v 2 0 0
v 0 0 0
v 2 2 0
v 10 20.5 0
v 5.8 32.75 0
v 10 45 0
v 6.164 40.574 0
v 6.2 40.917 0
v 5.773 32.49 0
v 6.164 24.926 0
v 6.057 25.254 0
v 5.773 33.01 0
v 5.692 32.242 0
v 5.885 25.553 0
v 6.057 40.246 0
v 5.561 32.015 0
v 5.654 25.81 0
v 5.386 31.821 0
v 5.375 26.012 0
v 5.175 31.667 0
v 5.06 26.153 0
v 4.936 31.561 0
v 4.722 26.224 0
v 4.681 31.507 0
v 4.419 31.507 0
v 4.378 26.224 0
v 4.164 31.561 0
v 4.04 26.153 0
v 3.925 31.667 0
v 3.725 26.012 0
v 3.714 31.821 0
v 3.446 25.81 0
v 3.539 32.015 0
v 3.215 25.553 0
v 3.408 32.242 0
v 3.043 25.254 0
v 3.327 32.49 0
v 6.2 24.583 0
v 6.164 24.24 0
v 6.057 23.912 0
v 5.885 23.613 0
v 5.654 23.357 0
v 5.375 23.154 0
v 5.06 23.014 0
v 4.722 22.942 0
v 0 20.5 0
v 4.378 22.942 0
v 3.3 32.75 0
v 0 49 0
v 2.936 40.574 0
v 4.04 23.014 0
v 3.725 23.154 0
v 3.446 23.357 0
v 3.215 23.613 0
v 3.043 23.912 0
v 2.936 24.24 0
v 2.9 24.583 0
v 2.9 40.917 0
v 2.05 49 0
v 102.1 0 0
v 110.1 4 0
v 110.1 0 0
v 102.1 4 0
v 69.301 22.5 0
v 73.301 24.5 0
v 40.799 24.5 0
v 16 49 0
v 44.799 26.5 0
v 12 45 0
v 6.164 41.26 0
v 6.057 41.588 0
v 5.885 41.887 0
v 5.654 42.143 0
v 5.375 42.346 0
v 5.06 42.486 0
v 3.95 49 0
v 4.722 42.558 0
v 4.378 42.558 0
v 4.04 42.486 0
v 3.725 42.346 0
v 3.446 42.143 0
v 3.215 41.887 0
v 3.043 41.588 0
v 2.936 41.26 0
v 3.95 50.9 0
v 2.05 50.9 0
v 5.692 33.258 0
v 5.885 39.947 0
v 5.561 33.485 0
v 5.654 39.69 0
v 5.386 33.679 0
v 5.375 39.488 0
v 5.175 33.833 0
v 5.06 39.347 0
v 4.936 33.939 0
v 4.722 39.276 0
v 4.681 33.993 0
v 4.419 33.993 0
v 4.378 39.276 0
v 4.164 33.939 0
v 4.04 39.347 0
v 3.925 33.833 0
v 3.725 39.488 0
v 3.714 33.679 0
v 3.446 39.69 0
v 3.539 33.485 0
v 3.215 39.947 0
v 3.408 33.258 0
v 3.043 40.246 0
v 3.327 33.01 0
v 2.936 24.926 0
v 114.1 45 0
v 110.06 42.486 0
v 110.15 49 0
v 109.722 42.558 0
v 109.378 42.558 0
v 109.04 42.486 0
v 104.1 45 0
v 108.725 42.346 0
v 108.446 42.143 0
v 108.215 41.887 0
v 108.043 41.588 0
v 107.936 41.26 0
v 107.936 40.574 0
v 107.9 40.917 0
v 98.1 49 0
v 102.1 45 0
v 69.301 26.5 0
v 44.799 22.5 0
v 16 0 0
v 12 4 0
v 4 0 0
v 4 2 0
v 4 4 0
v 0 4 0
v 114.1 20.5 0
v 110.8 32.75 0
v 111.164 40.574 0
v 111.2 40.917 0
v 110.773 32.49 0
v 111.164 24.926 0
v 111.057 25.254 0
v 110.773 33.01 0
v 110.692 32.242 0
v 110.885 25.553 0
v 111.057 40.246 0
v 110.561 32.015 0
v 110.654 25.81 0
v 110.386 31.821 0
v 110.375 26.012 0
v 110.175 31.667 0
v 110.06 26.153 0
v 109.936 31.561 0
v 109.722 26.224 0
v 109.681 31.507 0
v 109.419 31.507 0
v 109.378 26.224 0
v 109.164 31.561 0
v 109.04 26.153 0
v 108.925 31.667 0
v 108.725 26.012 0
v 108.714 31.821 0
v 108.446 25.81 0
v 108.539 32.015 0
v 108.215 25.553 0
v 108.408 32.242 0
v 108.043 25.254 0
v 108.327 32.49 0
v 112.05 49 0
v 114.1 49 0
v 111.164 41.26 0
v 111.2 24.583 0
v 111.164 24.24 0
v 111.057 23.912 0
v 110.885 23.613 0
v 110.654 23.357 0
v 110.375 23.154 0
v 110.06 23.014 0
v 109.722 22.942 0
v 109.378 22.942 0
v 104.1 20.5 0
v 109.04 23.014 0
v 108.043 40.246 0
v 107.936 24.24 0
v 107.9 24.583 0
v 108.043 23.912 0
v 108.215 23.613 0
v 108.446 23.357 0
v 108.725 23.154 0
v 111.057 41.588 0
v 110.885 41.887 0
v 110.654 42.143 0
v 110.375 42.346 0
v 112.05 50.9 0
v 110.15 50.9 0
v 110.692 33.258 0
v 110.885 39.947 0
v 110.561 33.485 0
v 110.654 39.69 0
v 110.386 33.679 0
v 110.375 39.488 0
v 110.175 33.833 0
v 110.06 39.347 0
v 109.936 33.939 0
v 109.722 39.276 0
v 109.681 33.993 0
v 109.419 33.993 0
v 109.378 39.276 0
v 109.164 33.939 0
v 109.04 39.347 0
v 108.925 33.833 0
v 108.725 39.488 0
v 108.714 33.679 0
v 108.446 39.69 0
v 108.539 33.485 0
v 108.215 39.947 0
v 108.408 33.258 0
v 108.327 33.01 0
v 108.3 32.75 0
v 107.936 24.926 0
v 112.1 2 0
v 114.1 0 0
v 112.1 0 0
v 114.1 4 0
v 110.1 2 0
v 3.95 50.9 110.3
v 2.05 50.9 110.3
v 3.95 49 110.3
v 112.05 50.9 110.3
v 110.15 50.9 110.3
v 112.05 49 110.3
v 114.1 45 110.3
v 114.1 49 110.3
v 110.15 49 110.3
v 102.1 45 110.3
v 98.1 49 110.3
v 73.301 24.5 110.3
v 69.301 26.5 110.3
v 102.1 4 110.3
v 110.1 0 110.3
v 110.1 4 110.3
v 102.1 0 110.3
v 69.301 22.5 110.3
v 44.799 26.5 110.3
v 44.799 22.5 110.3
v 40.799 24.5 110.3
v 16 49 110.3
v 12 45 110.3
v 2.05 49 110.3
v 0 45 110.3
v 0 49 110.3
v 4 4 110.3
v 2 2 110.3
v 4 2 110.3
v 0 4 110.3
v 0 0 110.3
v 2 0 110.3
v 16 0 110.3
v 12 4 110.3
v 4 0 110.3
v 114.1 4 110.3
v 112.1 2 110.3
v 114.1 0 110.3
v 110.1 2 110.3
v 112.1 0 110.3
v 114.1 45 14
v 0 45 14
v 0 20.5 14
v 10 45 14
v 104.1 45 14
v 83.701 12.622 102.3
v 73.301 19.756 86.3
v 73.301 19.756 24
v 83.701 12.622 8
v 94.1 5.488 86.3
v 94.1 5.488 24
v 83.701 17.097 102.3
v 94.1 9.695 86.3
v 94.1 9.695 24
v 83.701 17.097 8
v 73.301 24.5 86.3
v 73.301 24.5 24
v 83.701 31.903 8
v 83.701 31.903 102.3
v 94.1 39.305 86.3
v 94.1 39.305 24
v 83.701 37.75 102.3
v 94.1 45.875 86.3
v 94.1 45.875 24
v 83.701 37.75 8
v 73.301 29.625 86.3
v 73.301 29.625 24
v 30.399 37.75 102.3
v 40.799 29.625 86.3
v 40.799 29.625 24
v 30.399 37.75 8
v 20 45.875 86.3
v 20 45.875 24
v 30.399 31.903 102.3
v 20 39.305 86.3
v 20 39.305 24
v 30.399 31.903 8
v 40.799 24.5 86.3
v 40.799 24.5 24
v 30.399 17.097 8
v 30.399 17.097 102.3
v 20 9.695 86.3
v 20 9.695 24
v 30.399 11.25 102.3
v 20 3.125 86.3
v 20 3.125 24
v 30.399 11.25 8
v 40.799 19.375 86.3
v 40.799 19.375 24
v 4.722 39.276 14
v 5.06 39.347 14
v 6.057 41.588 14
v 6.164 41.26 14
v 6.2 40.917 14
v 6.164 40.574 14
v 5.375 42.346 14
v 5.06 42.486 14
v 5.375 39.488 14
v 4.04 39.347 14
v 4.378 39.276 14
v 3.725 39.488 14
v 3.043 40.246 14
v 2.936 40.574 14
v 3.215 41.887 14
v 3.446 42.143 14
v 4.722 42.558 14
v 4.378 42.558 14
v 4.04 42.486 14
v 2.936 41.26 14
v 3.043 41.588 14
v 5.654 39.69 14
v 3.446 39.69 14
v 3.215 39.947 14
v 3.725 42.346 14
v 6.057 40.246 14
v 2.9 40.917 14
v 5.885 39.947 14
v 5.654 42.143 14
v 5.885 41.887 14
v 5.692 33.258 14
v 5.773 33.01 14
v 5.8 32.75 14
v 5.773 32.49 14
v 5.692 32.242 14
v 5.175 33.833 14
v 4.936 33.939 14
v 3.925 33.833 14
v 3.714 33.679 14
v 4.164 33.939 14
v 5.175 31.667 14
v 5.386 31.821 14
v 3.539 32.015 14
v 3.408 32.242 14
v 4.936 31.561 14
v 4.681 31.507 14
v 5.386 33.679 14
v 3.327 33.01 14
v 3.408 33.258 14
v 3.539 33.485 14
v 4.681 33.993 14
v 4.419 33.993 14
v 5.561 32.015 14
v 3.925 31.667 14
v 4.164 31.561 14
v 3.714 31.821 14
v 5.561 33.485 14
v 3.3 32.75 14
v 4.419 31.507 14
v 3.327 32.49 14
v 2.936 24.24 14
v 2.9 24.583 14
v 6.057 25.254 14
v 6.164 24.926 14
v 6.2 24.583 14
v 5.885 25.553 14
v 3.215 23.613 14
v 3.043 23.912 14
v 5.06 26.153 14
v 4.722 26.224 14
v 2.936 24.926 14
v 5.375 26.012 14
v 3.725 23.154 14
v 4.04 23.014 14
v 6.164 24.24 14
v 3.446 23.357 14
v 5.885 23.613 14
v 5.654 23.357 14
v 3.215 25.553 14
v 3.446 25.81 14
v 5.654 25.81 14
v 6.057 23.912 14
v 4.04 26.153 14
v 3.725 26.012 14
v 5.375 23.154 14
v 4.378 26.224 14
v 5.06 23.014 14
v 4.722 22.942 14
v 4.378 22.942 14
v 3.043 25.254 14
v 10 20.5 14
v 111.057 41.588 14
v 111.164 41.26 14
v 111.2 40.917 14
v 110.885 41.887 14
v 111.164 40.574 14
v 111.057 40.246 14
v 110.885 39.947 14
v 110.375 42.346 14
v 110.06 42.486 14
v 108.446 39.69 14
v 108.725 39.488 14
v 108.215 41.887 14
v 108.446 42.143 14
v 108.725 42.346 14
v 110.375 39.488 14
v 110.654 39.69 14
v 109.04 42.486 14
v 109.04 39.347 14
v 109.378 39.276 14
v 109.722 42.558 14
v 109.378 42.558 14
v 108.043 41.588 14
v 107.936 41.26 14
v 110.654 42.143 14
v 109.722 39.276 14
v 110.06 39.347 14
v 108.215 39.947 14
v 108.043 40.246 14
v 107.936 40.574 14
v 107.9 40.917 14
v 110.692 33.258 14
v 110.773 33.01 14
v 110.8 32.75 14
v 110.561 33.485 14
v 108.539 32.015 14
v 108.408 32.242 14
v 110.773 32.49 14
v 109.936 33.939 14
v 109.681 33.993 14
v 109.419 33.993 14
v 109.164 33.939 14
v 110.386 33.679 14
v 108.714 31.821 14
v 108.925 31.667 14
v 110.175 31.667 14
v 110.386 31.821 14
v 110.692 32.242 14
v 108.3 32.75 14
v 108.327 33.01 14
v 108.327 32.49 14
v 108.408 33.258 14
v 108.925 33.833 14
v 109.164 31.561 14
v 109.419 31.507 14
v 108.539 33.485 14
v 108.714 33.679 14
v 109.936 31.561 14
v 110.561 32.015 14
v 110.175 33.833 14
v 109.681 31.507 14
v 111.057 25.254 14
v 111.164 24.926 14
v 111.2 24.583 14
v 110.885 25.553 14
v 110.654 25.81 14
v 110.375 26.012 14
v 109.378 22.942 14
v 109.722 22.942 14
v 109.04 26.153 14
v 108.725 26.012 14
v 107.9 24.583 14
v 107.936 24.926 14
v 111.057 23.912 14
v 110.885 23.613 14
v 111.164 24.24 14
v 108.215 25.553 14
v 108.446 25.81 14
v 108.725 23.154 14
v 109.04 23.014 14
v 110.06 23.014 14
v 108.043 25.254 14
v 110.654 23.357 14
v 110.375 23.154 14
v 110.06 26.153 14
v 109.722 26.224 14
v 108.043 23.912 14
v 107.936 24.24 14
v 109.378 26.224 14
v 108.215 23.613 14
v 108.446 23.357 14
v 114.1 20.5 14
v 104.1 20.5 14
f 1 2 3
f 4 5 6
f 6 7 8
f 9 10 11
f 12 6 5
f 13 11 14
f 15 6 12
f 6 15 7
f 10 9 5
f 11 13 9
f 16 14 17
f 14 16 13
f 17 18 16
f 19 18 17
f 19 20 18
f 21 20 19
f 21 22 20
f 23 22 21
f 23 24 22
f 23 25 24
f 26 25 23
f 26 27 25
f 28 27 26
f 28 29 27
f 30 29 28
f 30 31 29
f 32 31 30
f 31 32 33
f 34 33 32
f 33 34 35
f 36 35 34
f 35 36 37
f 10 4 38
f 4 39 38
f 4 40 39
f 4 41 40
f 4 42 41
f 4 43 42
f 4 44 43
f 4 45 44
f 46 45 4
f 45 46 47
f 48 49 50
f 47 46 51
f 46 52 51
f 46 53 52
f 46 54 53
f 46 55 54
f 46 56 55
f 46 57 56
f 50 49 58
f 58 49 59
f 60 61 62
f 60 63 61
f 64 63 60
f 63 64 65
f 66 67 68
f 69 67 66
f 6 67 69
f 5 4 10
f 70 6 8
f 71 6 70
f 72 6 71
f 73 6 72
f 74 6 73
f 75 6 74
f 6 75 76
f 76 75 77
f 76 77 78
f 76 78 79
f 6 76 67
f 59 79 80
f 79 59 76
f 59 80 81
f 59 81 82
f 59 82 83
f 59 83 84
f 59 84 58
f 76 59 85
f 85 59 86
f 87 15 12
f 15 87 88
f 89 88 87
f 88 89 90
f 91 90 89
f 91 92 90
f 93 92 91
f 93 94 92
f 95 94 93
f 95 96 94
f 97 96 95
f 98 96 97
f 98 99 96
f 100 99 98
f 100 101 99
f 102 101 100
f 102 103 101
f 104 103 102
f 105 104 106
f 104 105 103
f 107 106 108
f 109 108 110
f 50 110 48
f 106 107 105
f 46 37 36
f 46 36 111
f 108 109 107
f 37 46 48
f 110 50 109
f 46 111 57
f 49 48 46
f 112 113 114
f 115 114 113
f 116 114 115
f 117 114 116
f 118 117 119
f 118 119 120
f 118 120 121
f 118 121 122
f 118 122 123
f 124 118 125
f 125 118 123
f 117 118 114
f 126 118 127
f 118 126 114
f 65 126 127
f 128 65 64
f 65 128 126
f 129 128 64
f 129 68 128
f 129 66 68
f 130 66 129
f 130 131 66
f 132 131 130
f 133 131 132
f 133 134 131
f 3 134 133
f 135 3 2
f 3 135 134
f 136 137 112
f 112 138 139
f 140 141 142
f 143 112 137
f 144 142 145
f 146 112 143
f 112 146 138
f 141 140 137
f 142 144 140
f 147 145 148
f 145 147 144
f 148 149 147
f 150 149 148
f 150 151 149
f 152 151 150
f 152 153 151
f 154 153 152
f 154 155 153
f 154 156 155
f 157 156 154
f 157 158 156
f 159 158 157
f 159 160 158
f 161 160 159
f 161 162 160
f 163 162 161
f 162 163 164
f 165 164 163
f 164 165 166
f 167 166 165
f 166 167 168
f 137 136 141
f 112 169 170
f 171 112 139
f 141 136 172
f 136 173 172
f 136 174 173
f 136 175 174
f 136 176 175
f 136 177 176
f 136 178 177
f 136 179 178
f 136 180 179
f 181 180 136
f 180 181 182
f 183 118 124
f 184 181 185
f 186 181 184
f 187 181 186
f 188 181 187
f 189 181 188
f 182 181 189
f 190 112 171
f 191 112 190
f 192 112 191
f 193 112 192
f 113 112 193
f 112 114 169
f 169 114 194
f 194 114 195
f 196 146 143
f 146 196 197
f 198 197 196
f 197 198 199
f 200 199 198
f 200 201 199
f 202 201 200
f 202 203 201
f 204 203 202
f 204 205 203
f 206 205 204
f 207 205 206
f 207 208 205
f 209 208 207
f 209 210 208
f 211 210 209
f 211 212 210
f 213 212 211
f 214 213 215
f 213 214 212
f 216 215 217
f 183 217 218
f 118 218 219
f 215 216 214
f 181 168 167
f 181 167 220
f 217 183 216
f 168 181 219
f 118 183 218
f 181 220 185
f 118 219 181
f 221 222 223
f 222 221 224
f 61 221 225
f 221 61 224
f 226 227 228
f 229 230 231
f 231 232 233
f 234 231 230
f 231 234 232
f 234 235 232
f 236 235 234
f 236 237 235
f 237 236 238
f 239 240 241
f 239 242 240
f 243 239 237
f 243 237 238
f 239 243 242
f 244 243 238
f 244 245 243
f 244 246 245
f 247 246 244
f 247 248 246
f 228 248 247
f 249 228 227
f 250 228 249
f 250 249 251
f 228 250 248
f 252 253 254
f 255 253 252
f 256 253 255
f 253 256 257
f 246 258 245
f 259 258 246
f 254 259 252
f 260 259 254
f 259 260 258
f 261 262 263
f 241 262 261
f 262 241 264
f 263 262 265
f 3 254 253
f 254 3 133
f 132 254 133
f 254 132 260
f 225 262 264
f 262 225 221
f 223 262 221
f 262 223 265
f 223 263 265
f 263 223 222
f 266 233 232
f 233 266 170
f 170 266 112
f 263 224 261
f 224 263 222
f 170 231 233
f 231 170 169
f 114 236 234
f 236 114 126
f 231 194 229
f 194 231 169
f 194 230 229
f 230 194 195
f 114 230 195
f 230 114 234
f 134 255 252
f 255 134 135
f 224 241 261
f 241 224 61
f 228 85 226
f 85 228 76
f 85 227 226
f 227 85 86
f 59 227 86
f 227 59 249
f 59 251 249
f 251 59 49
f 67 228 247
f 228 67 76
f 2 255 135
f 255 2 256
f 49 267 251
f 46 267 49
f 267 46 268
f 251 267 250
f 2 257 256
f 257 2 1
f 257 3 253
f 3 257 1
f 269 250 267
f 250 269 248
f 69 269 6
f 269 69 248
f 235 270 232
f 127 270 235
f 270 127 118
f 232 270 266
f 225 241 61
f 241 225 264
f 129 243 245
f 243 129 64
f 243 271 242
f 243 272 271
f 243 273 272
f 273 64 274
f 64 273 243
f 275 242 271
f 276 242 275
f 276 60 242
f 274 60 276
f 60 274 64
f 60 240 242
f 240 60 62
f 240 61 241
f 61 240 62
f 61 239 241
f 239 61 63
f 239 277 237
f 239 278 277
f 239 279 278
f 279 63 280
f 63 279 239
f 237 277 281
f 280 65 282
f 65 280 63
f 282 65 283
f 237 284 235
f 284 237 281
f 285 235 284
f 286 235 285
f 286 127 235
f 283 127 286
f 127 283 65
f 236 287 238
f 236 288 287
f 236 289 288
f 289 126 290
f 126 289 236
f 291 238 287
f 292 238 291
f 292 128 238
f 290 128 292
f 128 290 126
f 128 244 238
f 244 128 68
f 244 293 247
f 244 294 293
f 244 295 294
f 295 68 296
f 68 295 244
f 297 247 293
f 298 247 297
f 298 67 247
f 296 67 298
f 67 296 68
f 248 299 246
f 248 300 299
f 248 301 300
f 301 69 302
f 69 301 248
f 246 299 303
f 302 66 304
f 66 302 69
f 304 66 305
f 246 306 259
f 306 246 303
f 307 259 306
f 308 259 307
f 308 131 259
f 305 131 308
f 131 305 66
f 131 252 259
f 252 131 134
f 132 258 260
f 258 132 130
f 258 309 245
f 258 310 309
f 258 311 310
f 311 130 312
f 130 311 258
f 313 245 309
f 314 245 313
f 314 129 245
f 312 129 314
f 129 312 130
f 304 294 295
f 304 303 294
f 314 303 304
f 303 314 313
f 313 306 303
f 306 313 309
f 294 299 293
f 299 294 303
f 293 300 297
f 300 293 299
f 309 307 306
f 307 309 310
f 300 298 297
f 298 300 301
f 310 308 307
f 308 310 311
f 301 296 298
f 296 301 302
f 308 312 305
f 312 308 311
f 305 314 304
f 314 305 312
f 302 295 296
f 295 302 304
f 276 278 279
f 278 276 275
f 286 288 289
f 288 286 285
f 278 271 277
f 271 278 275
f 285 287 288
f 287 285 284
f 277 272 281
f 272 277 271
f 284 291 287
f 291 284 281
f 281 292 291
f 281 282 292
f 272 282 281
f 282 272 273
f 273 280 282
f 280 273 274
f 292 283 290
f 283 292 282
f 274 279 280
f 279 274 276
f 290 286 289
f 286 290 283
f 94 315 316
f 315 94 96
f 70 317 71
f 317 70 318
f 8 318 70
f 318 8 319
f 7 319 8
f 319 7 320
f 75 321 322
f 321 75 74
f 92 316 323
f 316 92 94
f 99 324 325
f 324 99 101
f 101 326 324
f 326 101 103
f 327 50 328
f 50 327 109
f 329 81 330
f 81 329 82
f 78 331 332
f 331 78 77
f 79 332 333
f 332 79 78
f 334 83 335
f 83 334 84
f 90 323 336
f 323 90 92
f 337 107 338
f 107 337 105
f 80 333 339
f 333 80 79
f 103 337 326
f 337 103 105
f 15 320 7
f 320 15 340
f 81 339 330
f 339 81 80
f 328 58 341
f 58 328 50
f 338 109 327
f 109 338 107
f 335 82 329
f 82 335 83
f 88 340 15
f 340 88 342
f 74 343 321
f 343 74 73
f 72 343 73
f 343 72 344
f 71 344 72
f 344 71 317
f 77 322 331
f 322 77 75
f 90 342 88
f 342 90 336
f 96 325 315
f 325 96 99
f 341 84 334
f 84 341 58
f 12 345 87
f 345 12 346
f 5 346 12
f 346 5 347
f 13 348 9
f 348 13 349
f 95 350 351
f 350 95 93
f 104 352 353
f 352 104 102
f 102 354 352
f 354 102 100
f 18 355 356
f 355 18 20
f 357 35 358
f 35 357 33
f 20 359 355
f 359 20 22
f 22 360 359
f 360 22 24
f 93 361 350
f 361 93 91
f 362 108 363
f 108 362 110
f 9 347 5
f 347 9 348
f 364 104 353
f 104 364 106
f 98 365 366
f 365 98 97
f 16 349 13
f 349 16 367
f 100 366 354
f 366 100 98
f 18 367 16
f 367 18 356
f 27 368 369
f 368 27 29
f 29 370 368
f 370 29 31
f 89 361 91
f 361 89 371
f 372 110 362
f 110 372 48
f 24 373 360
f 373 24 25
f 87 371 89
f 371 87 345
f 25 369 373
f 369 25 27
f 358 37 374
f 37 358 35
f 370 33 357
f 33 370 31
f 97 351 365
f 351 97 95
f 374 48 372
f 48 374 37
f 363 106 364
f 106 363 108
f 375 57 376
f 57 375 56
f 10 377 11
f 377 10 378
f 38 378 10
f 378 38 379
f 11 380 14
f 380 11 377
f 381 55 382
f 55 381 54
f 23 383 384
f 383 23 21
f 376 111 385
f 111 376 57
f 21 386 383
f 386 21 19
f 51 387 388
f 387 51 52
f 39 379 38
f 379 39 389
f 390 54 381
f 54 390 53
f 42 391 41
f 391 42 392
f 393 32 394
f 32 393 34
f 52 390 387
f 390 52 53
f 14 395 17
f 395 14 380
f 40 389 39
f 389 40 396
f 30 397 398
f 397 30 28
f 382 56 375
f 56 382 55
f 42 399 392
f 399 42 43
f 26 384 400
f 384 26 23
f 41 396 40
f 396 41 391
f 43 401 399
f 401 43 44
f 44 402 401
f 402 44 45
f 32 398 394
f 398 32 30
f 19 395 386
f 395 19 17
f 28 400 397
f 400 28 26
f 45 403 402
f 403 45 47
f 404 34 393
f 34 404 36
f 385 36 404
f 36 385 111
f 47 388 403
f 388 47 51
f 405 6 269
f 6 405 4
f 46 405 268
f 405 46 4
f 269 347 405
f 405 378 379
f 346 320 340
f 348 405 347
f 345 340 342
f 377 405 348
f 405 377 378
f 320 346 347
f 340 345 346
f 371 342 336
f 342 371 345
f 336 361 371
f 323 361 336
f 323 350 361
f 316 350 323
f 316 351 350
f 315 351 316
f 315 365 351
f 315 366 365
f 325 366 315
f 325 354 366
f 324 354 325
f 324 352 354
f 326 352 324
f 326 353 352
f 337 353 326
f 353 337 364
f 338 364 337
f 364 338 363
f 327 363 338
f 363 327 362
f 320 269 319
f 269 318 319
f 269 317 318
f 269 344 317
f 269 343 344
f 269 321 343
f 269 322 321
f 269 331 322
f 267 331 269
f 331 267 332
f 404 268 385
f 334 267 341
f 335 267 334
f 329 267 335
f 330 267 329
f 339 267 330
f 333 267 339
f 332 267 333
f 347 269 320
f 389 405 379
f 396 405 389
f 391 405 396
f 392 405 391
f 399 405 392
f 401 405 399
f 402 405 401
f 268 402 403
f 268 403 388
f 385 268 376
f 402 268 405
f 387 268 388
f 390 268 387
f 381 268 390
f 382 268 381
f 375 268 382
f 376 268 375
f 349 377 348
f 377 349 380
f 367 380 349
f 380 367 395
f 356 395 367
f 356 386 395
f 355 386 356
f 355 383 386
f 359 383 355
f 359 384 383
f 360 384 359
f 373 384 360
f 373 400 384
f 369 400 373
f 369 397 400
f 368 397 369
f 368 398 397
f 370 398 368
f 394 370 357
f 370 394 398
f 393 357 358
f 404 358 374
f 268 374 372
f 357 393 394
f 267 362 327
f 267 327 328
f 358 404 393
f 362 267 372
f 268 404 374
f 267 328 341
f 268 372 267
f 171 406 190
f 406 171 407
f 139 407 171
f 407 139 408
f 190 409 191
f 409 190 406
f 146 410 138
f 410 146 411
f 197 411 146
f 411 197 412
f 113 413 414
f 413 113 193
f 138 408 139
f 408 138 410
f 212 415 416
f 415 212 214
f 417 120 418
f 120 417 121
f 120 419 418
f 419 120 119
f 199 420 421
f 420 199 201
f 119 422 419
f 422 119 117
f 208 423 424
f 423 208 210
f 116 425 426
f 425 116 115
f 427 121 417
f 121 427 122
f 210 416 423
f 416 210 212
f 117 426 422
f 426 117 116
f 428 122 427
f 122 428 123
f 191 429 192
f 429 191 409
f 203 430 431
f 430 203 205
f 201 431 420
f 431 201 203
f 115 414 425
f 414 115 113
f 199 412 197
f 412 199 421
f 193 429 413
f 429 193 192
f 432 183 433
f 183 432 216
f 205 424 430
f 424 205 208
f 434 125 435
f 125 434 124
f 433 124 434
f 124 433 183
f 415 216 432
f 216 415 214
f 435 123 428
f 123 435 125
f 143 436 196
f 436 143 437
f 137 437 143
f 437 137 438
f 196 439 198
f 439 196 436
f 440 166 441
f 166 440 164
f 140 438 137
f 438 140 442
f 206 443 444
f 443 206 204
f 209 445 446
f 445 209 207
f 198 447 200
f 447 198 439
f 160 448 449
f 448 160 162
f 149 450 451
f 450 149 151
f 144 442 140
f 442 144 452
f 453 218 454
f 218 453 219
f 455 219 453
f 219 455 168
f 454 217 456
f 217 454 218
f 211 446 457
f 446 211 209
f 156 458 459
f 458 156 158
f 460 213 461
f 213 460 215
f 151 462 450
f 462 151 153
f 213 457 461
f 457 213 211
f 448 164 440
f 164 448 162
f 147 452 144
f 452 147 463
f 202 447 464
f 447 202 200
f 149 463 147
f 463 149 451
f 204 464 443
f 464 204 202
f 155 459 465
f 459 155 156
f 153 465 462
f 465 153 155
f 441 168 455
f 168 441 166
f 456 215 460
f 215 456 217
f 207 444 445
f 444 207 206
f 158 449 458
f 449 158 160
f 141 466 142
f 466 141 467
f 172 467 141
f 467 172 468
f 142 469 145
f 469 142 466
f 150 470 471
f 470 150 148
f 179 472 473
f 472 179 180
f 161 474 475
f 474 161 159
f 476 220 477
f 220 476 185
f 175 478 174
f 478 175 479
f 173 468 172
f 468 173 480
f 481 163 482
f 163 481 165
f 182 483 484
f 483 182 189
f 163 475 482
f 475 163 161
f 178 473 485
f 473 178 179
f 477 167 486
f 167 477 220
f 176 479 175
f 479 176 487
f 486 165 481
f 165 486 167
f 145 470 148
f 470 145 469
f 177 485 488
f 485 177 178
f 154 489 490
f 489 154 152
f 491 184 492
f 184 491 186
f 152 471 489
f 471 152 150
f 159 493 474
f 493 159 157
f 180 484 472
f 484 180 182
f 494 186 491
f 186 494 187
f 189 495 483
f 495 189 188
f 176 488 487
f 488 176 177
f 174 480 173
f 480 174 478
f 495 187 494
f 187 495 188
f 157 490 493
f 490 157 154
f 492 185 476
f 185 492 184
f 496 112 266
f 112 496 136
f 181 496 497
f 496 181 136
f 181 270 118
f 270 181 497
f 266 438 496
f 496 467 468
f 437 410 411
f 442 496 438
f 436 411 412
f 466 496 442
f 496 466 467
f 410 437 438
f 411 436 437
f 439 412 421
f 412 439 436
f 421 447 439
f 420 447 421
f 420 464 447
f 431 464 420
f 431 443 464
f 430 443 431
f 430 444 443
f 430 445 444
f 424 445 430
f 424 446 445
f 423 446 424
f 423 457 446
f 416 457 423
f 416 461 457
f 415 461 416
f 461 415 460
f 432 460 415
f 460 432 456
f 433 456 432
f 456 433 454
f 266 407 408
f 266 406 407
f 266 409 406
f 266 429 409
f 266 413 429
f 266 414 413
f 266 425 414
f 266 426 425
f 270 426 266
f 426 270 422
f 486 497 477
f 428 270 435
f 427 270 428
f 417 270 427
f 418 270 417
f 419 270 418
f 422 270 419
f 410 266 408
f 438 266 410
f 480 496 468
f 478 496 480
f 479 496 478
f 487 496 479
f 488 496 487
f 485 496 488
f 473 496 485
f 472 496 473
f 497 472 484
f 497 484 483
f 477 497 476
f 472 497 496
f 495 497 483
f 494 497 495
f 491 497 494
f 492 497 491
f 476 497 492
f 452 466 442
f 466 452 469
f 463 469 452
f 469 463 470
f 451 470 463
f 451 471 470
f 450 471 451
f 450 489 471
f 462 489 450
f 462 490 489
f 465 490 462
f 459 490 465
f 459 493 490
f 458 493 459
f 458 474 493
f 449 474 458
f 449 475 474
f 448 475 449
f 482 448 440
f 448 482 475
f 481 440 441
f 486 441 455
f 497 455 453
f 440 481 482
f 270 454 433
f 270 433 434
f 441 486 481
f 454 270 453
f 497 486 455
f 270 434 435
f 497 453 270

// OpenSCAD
// file: Structures/Hexagon.scad
// created by IndiePandaaaaa | Lukas

function hexagon_get_inner_diameter(single_outer_diameter = 20) = tan(60) * (single_outer_diameter / 2);

function hexagon_inbetween_distance_x(single_outer_diameter = 20) = single_outer_diameter -
    hexagon_get_inner_diameter(single_outer_diameter);

function hexagon_get_y_inner_element_additional_height(single_outer_diameter = 20) = single_outer_diameter / 2 +
        hexagon_inbetween_distance_x(single_outer_diameter) * cos(30) + (single_outer_diameter / 2) * cos(60);

function hexagon_get_y_outer_element_height(single_outer_diameter = 20) = single_outer_diameter;

function hexagon_get_y_next_structure(single_outer_diameter = 20) = (single_outer_diameter / 2 * 3) +
            hexagon_inbetween_distance_x(single_outer_diameter) * cos(30) * 2;

function hexagon_get_y_element_height(single_outer_diameter = 20) = hexagon_get_y_outer_element_height(
single_outer_diameter) + hexagon_get_y_inner_element_additional_height(single_outer_diameter);

function hexagon_get_x_element_count(width, single_outer_diameter = 20) = floor(width / single_outer_diameter);

function hexagon_get_y_element_count(depth, single_outer_diameter = 20) = floor(((depth - (hexagon_get_y_element_height(
single_outer_diameter) -
    hexagon_get_y_next_structure(single_outer_diameter))) / hexagon_get_y_next_structure(single_outer_diameter)) * 2);

function hexagon_get_used_width(width, single_outer_diameter = 20) = single_outer_diameter *
    hexagon_get_x_element_count(width, single_outer_diameter) - hexagon_inbetween_distance_x(single_outer_diameter);

//function hexagon_get_used_depth(depth, single_outer_diameter = 20) = hexagon_get_y_next_structure(single_outer_diameter)
//    * (floor(depth / hexagon_get_y_next_structure(single_outer_diameter))) + (hexagon_inbetween_distance_x(single_outer_diameter)) * cos(30);

//function hexagon_get_used_depth(depth, single_outer_diameter = 20) = (hexagon_get_y_element_count(depth,single_outer_diameter) - 1) * 
//			hexagon_get_y_next_structure(single_outer_diameter) + hexagon_get_y_element_height(single_outer_diameter);

function hexagon_get_used_depth(depth, single_outer_diameter = 20) = round(hexagon_get_y_element_count(depth,
single_outer_diameter) / 2) * hexagon_get_y_outer_element_height(single_outer_diameter) +
        floor(hexagon_get_y_element_count(depth, single_outer_diameter) / 2) * (hexagon_get_y_next_structure(
    single_outer_diameter) - single_outer_diameter) +
            (hexagon_get_y_element_count(depth, single_outer_diameter) + 1) % 2 * (hexagon_get_y_element_height(
    single_outer_diameter) - hexagon_get_y_next_structure(single_outer_diameter));

module hexagon_pattern(width, depth, thickness, single_outer_diameter = 20, vertices = 6) {
    inner_diameter = hexagon_get_inner_diameter(single_outer_diameter);

    count_x = hexagon_get_x_element_count(width, single_outer_diameter);
    count_y = hexagon_get_y_element_count(depth, single_outer_diameter);

    angle = 360 / vertices * 1.5;

    for (y = [0:count_y - 1]) {
        for (x = [0:count_x - 1]) {

            if (y % 2 == 0) {
                translate([inner_diameter / 2 + single_outer_diameter * x, (single_outer_diameter / 2) + inner_diameter
                    * y, - 0.01]) {
                    linear_extrude(height = thickness + 0.02) {
                        rotate([0, 0, angle]) circle(d = single_outer_diameter, $fn = vertices);
                    }
                }
            } else if (x < count_x - 1 && y % 2 == 1) {
                translate([inner_diameter / 2 + single_outer_diameter * x + single_outer_diameter / 2,
                        (single_outer_diameter / 2) + inner_diameter * y, - 0.01]) {
                    linear_extrude(height = thickness + 0.02) {
                        rotate([0, 0, angle]) circle(d = single_outer_diameter, $fn = vertices);
                    }
                }
            }

        }
    }
}

width = 100;
depth = 100;
difference() {
    cube([width, depth, 3]);
    translate([(width - hexagon_get_used_width(width)) / 2, (depth - hexagon_get_used_depth(depth)) / 2, 0])
        hexagon_pattern(width, depth, 3);
}
// main file
// created by IndiePandaaaaa | Lukas

use <202304 HDD_Bay_stackable.scad>
use <Structures/Hexagon.scad>

MODEL_TOLERANCE = 0.15;
TOLERANCE_HDD = 1;

SATA_CONNECTORS = 3;
SATA_CONNECTOR_WIDTH = 15;

SCREW_LENGTH = 12 + 2;  // additionally 2mm for less tolerance issues with threading
SCREW_SOCKET_WIDTH = 10;
FAN_CaseMountingSocket_DISTANCE = 105; // 105 mm is the distance between screws for an 120 mm fan
HDD_BOTTOM_SCREW_DEPTH = 41.3;
UBASE_THICKNESS = 4;
WIDTH_HDD = 101.5;
RUBBER_WIDTH_ADDITIONAL = 1.3;

FULLMODEL_DEPTH = SCREW_LENGTH + HDD_BOTTOM_SCREW_DEPTH + 55; // ~ 110 mm
FULLMODEL_HEIGHT = UBASE_THICKNESS + SATA_CONNECTORS * SATA_CONNECTOR_WIDTH; // ~ 53 mm height (~15mm per connector)
FULLMODEL_WIDTH = UBASE_THICKNESS * 2 + TOLERANCE_HDD * 2 + WIDTH_HDD + 2 * RUBBER_WIDTH_ADDITIONAL;

X_ANGLE = 52;

union() {
    difference() {
        UBase(FULLMODEL_DEPTH, FULLMODEL_HEIGHT, WIDTH_HDD + 2 * RUBBER_WIDTH_ADDITIONAL,
        TOLERANCE_HDD, UBASE_THICKNESS);
        translate([0, UBASE_THICKNESS, 0])
            cube([FULLMODEL_WIDTH, FULLMODEL_HEIGHT - UBASE_THICKNESS * 2, FULLMODEL_DEPTH + 1]);
        translate([UBASE_THICKNESS, 0, 0])
            cube([FULLMODEL_WIDTH - UBASE_THICKNESS * 2, FULLMODEL_HEIGHT, FULLMODEL_DEPTH + 1]);
    }

    difference() {
        slope_height = (FULLMODEL_HEIGHT - UBASE_THICKNESS) / 2;
        slope_width = tan(X_ANGLE) * slope_height;
        width_offset = 12;
        linear_extrude(FULLMODEL_DEPTH) {
            polygon([
                    [UBASE_THICKNESS, UBASE_THICKNESS],
                    [UBASE_THICKNESS, 0],
                    [UBASE_THICKNESS + width_offset, 0],
                    [UBASE_THICKNESS + width_offset + slope_width, slope_height],
                    [FULLMODEL_WIDTH - width_offset - UBASE_THICKNESS - slope_width, slope_height],
                    [FULLMODEL_WIDTH - width_offset, 0],
                    [FULLMODEL_WIDTH - UBASE_THICKNESS, 0],
                    [FULLMODEL_WIDTH - UBASE_THICKNESS, UBASE_THICKNESS],
                    [FULLMODEL_WIDTH - width_offset, UBASE_THICKNESS],
                    [FULLMODEL_WIDTH - width_offset - slope_width, slope_height + UBASE_THICKNESS / 2],
                    [FULLMODEL_WIDTH - width_offset, FULLMODEL_HEIGHT - UBASE_THICKNESS],
                    [FULLMODEL_WIDTH, FULLMODEL_HEIGHT - UBASE_THICKNESS],
                    [FULLMODEL_WIDTH, FULLMODEL_HEIGHT],
                    [FULLMODEL_WIDTH - UBASE_THICKNESS - width_offset, FULLMODEL_HEIGHT],
                    [FULLMODEL_WIDTH - UBASE_THICKNESS - width_offset - slope_width, FULLMODEL_HEIGHT - slope_height],
                    [UBASE_THICKNESS + width_offset + slope_width, FULLMODEL_HEIGHT - slope_height],
                    [width_offset + UBASE_THICKNESS, FULLMODEL_HEIGHT],
                    [0, FULLMODEL_HEIGHT],
                    [0, FULLMODEL_HEIGHT - UBASE_THICKNESS],
                    [width_offset, FULLMODEL_HEIGHT - UBASE_THICKNESS],
                    [width_offset + slope_width, slope_height + UBASE_THICKNESS / 2],
                    [width_offset, UBASE_THICKNESS],
                ]);
        }

        translate([0, FULLMODEL_HEIGHT, 0]) rotate([90, 0, 0]) {
            linear_extrude(FULLMODEL_HEIGHT) {
                middle_width = (FULLMODEL_WIDTH - width_offset - UBASE_THICKNESS) - (UBASE_THICKNESS + width_offset +
                    slope_width);
                polygon([
                        [UBASE_THICKNESS + width_offset + UBASE_THICKNESS, width_offset * 2],
                        [UBASE_THICKNESS + width_offset + slope_width / 2, UBASE_THICKNESS * 2],
                        [UBASE_THICKNESS + width_offset + slope_width - UBASE_THICKNESS, width_offset * 2],
                        [UBASE_THICKNESS + width_offset + slope_width - UBASE_THICKNESS,
                            FULLMODEL_DEPTH - width_offset * 2],
                        [UBASE_THICKNESS + width_offset + slope_width / 2, FULLMODEL_DEPTH - UBASE_THICKNESS * 2],
                        [UBASE_THICKNESS + width_offset + UBASE_THICKNESS, FULLMODEL_DEPTH - width_offset * 2],
                    ]);
                polygon([
                        [UBASE_THICKNESS + middle_width + width_offset + UBASE_THICKNESS, width_offset * 2],
                        [UBASE_THICKNESS + middle_width + width_offset + slope_width / 2, UBASE_THICKNESS * 2],
                        [UBASE_THICKNESS + middle_width + width_offset + slope_width - UBASE_THICKNESS,
                            width_offset * 2],
                        [UBASE_THICKNESS + middle_width + width_offset + slope_width - UBASE_THICKNESS,
                            FULLMODEL_DEPTH - width_offset * 2],
                        [UBASE_THICKNESS + middle_width + width_offset + slope_width / 2,
                            FULLMODEL_DEPTH - UBASE_THICKNESS * 2],
                        [UBASE_THICKNESS + middle_width + width_offset + UBASE_THICKNESS,
                            FULLMODEL_DEPTH - width_offset * 2],
                    ]);
            }
        }
    }
    translate([0, FULLMODEL_HEIGHT - UBASE_THICKNESS, 0]) rotate([90, 0, 0])
        CaseMountingSocket(SCREW_SOCKET_WIDTH, SCREW_LENGTH, FULLMODEL_HEIGHT / 2, FAN_CaseMountingSocket_DISTANCE,
        FULLMODEL_WIDTH, for_cutout_only = false);
}
